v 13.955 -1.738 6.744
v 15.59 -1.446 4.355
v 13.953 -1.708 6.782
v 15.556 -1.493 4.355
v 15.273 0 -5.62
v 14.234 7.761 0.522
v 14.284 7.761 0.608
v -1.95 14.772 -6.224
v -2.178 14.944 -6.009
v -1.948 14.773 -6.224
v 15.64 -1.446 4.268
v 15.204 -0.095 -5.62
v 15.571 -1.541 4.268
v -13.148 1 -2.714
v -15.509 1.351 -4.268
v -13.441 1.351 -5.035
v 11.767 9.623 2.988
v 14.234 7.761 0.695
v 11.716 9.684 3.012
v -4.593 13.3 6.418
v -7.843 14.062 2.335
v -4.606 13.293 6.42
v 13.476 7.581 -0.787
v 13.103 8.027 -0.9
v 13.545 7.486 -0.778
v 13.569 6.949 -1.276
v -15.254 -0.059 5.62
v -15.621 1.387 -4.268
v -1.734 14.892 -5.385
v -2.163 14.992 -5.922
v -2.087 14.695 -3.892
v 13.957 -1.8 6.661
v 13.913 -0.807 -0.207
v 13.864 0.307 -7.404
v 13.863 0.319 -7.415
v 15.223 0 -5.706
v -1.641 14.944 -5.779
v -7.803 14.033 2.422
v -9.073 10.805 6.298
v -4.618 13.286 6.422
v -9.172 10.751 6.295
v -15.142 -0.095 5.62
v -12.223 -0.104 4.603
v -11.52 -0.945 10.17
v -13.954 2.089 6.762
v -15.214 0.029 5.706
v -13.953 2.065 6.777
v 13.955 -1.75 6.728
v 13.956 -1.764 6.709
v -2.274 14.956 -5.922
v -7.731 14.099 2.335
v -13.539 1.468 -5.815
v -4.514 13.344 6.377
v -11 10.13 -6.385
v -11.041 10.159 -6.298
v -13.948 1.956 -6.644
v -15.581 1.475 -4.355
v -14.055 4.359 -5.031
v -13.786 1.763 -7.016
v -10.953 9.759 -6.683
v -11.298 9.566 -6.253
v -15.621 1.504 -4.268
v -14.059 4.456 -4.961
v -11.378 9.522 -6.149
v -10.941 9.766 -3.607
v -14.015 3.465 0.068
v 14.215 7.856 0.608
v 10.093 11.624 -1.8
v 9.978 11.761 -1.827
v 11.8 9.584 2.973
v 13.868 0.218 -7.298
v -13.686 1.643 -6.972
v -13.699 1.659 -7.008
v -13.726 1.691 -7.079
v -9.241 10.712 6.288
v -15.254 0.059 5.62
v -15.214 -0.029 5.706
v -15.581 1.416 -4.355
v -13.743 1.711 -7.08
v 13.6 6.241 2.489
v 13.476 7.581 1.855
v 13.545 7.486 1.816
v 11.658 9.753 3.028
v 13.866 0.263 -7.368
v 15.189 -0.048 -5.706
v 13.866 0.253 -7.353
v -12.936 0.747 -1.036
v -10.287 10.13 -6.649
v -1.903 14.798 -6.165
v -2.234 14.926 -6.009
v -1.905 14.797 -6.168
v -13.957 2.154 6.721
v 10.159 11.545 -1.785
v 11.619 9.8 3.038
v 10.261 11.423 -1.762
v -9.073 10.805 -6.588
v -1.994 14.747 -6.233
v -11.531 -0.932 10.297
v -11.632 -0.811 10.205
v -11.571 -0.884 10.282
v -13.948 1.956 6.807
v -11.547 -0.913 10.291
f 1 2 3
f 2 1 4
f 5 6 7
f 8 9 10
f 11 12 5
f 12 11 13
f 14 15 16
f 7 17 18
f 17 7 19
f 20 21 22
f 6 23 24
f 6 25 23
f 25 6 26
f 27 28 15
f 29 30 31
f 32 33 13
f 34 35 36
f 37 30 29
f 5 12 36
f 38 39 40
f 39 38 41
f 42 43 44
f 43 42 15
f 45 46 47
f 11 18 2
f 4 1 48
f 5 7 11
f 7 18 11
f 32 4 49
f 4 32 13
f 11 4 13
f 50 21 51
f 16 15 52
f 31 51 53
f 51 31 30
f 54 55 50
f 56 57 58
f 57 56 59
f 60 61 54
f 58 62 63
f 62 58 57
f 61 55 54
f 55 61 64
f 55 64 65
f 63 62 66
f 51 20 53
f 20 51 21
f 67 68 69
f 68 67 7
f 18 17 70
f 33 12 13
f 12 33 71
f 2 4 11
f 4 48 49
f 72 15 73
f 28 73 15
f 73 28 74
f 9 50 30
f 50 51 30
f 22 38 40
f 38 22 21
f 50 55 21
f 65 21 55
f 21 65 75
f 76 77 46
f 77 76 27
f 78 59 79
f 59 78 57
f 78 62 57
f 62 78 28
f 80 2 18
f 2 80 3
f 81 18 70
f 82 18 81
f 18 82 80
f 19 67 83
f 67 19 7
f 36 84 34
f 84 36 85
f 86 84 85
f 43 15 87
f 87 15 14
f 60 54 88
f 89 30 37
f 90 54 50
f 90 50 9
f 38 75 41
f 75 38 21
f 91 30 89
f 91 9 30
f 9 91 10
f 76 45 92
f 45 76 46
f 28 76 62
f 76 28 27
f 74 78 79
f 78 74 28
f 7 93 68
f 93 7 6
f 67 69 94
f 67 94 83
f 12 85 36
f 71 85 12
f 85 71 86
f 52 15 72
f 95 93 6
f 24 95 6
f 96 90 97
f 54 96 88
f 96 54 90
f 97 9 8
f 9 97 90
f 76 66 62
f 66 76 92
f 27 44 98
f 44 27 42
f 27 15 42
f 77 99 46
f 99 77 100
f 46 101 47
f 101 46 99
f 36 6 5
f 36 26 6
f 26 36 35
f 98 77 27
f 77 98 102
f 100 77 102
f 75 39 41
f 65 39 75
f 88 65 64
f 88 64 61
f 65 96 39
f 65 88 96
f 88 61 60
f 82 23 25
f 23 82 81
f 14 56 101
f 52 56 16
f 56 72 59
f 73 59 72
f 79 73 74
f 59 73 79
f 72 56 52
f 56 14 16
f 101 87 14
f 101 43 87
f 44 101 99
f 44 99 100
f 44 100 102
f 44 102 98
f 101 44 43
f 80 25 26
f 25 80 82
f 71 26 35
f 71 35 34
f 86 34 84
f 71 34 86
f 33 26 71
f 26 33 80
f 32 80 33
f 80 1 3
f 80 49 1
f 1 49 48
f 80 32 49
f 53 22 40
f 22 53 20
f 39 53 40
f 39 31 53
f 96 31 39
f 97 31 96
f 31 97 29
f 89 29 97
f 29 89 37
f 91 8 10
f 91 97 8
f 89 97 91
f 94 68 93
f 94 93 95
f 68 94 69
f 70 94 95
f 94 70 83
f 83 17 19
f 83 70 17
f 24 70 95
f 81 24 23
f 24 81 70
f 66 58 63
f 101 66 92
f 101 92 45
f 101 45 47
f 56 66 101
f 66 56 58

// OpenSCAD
// Auto-generated OpenSCAD file

    inner_points = 10*[[1.4127776500989453, -0.7887289142226223, 3.3946051633490118e-15], [-1.4127776500989453, 0.7887289142226223, -3.3946051633490118e-15], [7.699325831418754e-14, 1.448747966845947e-13, 1.618033988749895], [0.7887289142226223, 1.4127776500989453, -1.6402787932550622e-13], [1.3866917666528789, -0.20152279240725185, 0.8090169943748995], [1.386691766652802, -0.2015227924073968, -0.8090169943749954], [0.899230489753498, -1.0746673987146065, 0.809016994375001], [-0.8992304897534211, 1.0746673987147513, 0.8090169943748939], [-0.899230489753498, 1.0746673987146065, -0.809016994375001], [-1.386691766652802, 0.2015227924073968, 0.8090169943749954], [1.3444839206104982, 0.7485966710918835, 0.499999999999869], [1.3444839206104504, 0.7485966710917942, -0.500000000000131], [-0.06829372948844725, 1.5373255853145058, 0.49999999999986555], [-0.06829372948849499, 1.5373255853144165, -0.5000000000001343], [0.8309367602650506, 0.46265818659989943, 1.3090169943748666], [0.8309367602649261, 0.46265818659966507, -1.3090169943750283], [0.04220784604242839, -0.950119463499046, 1.3090169943750305], [-0.042207846042303876, 0.9501194634992803, 1.3090169943748644], [-0.04220784604242839, 0.950119463499046, -1.3090169943750305], [-0.8309367602649261, -0.46265818659966507, 1.3090169943750283]];

    outer_points = 10*[[1.51730962461505, 0.0, -0.5619657389916497], [-1.51730962461505, 0.0, 0.5619657389916497], [0.5173908766017687, 0.6315464316752465, 1.3969573272642983], [-0.2193448714004602, 1.4896922814420965, -0.592231983898246], [1.4184434174514022, 0.7761134471924181, 0.0608290828944803], [0.9010525408496336, 0.14456701551717166, -1.3361282443698181], [1.5540060032348615, -0.14456701551717166, 0.42684857816837674], [-1.0366151266330927, 0.7761134471924181, 0.9701087490959216], [-1.5540060032348615, 0.14456701551717166, -0.42684857816837674], [-0.9010525408496336, -0.14456701551717166, 1.3361282443698181], [0.7410836573200632, 1.4003449522003508, -0.3284250545406229], [0.4213185101110674, 1.0100277919513354, -1.1917921636231694], [-0.7762259672949867, 1.4003449522003508, 0.2335406844510268], [-1.0959911145039825, 1.0100277919513354, -0.6298264246315197], [0.7777800359398745, 1.2557779366831792, 0.6603892626194036], [-0.05937598787088977, 0.23391434475891726, -1.5999351737274412], [0.9971249073403348, -0.23391434475891726, 1.2526212465176494], [-0.15996888352957034, 1.2557779366831792, 1.0077031898291953], [-0.9971249073403348, 0.23391434475891726, -1.2526212465176494], [0.05937598787088977, -0.23391434475891726, 1.5999351737274412]];

    // Convex hull for inner set (I)
    module inner_hull() {
        hull() {
            for (p = inner_points) {
                translate(p) sphere(r=0.1);
            }
        }
    }

    // Convex hull for outer set (O) minus inner hull (O \ I)
    module outer_minus_inner() {
        difference() {
            hull() {
                for (p = outer_points) {
                    translate(p) sphere(r=0.1);
                }
            }
            inner_hull(); // Subtract inner hull
        }
    }

    // Convex hull for outer set (O) minus all translated inner hulls
    module outer_minus_AllTranslationInner() {
        difference() {
            hull() {
                for (p = outer_points) {
                    translate(p) sphere(r=0.1);
                }
            }
            hull() {
                translate([0,0,50]) inner_hull();
                translate([0,0,-50]) inner_hull();
            }; // Subtract translated inner hulls
        }
    }

    // Difference between outer_minus_inner and outer_minus_AllTranslationInner
    module outer_minus_inner_diff() {
        difference() {
            // Outer minus inner
            difference() {
                hull() {
                    for (p = outer_points) {
                        translate(p) sphere(r=0.1);
                    }
                }
                inner_hull();
            }

            // Subtract Outer minus AllTranslationInner
            difference() {
                hull() {
                    for (p = outer_points) {
                        translate(p) sphere(r=0.1);
                    }
                }
                hull() {
                    translate([0,0,50]) inner_hull();
                    translate([0,0,-50]) inner_hull();
                };
            }
        }
    }

    // Rendering all with colors applied
    color([0, 1, 0, 1]) outer_minus_AllTranslationInner(); // Opaque green
    
